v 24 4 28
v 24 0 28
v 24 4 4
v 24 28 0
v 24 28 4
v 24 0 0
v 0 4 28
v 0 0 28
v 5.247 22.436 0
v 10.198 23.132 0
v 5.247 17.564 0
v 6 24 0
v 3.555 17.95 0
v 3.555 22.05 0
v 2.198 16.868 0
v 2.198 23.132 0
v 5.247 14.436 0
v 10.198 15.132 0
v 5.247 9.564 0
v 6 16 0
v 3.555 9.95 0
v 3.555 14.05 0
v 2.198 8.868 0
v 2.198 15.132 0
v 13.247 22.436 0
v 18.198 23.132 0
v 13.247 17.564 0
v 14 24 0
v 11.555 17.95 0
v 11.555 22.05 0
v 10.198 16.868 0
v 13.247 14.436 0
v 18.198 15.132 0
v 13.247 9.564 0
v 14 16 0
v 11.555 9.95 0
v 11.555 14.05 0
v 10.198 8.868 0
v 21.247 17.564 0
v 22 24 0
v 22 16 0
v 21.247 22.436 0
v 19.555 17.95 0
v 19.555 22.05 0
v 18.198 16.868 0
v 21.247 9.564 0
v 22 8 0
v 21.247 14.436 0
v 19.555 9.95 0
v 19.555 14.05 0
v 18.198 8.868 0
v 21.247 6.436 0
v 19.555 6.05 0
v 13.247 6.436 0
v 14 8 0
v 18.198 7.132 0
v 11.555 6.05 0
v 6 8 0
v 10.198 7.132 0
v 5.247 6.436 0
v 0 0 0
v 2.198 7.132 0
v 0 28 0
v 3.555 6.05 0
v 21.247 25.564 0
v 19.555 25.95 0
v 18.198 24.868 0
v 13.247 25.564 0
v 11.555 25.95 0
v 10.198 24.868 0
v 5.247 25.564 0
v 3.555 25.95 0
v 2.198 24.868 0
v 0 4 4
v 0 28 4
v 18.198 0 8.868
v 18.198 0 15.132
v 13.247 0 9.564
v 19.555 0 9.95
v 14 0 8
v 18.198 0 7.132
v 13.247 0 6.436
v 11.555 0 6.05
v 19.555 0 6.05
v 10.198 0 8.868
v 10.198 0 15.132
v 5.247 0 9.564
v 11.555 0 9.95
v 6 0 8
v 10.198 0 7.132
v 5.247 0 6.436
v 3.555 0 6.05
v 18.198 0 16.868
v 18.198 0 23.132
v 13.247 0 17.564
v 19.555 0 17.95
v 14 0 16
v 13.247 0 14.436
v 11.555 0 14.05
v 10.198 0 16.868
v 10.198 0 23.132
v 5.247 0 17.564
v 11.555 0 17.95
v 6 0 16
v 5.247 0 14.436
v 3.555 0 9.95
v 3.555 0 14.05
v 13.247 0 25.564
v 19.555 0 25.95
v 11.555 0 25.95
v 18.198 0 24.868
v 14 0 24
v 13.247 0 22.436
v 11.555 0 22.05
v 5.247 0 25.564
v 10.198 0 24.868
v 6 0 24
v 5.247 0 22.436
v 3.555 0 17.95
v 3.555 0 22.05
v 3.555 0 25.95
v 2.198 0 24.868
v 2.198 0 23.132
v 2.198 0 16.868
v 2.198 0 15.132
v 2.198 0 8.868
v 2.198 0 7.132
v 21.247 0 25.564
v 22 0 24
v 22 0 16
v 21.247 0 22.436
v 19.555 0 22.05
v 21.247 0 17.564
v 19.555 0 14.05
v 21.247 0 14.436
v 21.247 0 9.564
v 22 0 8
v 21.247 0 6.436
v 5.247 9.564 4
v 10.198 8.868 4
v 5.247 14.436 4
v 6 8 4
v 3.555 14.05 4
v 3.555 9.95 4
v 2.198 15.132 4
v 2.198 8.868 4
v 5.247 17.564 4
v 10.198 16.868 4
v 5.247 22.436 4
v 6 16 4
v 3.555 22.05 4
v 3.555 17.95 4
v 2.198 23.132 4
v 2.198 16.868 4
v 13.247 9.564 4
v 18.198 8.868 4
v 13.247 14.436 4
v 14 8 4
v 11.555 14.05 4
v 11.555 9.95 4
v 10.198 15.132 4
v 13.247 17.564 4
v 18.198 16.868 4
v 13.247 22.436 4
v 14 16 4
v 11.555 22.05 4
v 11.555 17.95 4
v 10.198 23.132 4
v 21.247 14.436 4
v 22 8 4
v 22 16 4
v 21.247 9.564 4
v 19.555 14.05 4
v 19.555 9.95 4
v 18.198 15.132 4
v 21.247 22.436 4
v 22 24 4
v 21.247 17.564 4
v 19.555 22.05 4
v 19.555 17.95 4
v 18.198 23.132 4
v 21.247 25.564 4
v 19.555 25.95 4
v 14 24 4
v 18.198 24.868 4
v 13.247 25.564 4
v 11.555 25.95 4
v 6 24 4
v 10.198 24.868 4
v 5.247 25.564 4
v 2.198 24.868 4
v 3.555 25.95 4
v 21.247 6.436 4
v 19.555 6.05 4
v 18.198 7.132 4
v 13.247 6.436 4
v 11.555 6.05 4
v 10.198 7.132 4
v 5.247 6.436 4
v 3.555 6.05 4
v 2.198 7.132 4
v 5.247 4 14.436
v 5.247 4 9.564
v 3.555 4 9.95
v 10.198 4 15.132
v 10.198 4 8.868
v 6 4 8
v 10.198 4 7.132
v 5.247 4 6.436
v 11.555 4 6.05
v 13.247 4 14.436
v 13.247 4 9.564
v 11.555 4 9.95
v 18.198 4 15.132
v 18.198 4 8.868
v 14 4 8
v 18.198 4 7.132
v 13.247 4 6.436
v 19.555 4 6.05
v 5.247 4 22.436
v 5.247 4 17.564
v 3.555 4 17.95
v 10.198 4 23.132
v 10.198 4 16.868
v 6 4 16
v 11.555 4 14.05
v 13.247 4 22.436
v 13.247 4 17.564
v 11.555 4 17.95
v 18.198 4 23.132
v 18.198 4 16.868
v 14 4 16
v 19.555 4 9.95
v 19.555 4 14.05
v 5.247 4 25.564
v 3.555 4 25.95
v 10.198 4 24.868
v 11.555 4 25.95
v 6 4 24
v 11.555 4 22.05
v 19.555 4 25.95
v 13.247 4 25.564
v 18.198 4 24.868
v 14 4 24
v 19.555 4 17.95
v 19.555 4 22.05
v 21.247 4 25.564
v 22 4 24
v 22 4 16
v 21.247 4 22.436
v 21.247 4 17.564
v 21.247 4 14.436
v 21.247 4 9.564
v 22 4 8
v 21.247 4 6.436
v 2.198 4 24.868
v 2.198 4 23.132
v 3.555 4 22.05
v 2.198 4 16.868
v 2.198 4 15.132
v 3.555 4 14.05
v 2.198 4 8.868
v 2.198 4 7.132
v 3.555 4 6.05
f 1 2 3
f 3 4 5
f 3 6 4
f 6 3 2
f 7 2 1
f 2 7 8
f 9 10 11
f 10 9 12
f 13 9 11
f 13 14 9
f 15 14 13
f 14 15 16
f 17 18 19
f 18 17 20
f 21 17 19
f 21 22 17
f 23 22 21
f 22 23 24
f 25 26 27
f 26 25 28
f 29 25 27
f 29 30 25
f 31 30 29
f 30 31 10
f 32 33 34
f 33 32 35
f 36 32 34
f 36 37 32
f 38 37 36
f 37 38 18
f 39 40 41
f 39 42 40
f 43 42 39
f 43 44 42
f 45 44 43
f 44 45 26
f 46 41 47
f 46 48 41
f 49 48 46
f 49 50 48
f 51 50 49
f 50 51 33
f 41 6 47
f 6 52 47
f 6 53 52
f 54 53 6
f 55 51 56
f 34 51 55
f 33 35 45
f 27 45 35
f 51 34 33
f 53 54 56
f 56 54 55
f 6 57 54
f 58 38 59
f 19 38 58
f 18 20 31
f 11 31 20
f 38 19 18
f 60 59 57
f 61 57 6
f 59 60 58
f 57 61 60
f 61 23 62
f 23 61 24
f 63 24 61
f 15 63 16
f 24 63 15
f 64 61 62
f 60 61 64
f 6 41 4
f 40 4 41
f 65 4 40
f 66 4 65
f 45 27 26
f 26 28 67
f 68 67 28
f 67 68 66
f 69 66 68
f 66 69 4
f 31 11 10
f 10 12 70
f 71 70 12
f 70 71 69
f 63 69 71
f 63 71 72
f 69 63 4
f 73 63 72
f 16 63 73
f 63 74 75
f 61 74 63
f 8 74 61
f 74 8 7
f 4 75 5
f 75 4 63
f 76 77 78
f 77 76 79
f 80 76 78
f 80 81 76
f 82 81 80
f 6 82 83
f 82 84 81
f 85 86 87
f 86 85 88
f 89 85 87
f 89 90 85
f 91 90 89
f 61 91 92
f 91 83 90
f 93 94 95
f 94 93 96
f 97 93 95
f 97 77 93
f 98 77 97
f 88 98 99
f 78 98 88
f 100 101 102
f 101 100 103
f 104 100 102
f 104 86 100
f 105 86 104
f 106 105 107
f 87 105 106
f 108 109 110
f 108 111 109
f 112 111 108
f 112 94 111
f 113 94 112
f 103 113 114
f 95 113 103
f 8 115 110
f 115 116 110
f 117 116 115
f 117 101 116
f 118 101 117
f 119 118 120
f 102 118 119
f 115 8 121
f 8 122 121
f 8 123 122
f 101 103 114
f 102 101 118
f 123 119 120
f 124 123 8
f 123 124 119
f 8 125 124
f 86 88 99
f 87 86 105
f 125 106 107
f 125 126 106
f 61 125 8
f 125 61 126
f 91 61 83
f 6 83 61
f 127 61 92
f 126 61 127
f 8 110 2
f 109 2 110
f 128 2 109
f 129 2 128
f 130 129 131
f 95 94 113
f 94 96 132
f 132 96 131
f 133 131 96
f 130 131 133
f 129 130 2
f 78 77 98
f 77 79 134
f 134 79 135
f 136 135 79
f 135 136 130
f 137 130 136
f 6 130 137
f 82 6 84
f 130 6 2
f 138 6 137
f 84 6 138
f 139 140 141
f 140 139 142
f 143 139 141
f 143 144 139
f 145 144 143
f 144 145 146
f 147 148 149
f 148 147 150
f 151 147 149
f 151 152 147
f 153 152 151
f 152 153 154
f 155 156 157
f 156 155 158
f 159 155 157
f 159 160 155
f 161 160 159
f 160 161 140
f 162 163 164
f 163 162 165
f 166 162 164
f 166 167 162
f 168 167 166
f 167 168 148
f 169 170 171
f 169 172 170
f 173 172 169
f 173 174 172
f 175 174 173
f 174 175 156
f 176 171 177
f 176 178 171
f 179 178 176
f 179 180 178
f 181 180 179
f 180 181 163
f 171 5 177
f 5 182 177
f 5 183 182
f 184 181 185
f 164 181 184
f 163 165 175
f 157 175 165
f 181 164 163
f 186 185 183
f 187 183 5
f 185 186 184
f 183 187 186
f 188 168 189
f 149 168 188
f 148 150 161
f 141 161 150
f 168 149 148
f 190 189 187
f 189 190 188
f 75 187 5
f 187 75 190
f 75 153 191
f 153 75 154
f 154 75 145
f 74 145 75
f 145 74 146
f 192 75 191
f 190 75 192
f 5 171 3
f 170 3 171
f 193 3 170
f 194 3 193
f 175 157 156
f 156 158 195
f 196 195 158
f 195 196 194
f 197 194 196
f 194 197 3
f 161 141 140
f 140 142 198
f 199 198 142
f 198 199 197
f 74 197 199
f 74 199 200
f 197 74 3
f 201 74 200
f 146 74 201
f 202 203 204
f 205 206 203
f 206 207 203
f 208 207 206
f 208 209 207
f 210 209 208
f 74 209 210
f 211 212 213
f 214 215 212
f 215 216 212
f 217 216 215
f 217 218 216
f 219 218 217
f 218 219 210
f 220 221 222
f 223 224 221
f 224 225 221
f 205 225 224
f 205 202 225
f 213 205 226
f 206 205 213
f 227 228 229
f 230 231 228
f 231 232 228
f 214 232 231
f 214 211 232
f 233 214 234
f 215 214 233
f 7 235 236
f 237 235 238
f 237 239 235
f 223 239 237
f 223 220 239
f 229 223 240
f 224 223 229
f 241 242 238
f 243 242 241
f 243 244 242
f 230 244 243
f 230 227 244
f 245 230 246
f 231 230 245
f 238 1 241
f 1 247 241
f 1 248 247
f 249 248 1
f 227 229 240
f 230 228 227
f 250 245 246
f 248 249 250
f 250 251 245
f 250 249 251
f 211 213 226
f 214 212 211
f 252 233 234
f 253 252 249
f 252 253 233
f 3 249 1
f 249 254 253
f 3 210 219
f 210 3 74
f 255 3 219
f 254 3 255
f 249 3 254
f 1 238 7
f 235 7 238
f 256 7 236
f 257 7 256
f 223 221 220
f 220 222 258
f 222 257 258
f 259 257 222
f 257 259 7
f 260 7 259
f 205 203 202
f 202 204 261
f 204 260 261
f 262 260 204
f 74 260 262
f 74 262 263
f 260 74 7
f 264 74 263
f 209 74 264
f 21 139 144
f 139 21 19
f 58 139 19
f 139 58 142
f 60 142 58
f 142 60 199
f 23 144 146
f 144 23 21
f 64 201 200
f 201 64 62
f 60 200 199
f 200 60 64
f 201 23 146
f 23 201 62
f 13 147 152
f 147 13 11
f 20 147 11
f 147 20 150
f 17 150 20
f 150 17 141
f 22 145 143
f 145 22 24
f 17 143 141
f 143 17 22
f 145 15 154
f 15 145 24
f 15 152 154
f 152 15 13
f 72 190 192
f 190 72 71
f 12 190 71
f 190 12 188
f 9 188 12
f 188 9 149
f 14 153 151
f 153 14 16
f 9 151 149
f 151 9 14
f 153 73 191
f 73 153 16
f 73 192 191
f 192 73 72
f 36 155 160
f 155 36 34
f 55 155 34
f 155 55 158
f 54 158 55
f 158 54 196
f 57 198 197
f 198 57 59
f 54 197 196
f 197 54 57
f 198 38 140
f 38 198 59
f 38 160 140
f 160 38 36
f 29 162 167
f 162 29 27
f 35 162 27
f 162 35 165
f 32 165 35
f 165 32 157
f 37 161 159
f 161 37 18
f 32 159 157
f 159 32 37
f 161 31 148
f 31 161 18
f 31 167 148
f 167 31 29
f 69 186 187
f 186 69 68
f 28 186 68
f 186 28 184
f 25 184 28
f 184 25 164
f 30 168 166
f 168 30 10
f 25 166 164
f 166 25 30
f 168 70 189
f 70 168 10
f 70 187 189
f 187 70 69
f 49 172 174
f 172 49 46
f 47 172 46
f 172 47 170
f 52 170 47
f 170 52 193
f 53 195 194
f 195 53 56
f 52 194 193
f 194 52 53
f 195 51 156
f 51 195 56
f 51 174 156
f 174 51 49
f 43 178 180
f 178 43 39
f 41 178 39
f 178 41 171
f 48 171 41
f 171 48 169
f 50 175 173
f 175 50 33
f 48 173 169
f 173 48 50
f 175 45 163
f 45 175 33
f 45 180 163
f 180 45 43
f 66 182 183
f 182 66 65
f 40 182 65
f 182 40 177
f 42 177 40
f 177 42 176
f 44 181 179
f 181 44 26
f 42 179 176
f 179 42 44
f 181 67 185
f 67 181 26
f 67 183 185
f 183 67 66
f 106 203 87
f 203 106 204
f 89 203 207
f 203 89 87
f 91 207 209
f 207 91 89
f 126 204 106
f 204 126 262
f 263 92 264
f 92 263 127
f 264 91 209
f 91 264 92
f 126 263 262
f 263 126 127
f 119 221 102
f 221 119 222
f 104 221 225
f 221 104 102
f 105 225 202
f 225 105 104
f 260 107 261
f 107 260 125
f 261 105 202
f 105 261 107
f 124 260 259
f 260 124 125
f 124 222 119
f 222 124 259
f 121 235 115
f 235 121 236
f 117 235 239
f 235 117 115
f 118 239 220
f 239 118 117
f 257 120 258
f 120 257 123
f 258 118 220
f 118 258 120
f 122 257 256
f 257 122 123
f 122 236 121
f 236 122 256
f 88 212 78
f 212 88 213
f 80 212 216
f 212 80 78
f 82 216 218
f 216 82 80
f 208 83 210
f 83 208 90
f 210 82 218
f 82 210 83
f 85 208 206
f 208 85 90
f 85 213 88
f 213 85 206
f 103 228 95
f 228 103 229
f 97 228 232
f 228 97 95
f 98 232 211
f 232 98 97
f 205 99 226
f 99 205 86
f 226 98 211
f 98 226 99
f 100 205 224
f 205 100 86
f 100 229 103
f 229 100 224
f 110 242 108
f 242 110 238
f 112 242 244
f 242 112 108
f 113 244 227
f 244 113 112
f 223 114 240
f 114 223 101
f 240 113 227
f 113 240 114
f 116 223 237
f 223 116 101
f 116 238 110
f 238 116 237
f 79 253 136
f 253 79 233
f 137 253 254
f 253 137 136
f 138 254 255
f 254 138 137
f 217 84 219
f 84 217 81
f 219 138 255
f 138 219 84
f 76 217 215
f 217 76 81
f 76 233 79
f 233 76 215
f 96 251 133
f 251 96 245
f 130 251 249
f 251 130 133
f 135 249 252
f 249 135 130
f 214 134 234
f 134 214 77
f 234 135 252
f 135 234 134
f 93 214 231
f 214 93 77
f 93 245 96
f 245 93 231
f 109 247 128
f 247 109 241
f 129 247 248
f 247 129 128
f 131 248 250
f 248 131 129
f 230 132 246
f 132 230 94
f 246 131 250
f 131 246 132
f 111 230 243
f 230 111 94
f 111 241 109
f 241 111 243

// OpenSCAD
difference(){
difference(){
    cube([24,28,28]);
    translate([0, 4, 4]){
        cube([24,28,28]);};
};

union(){
    for(i=[0:2]){
        for(j=[0:2]){
            translate([4+ 8*i, 8+8*j, 0]){cylinder(h=4, r=2);}
            }
        }
    
    
    
translate([0,4,0]){   
    rotate([90,0,0]){
        union(){
            for(i=[0:2]){
                for(j=[0:2]){
                    translate([4+ 8*i, 8+8*j, 0]){cylinder(h=4, r=2);}
                }
            }
        }
    }
}

}
}
